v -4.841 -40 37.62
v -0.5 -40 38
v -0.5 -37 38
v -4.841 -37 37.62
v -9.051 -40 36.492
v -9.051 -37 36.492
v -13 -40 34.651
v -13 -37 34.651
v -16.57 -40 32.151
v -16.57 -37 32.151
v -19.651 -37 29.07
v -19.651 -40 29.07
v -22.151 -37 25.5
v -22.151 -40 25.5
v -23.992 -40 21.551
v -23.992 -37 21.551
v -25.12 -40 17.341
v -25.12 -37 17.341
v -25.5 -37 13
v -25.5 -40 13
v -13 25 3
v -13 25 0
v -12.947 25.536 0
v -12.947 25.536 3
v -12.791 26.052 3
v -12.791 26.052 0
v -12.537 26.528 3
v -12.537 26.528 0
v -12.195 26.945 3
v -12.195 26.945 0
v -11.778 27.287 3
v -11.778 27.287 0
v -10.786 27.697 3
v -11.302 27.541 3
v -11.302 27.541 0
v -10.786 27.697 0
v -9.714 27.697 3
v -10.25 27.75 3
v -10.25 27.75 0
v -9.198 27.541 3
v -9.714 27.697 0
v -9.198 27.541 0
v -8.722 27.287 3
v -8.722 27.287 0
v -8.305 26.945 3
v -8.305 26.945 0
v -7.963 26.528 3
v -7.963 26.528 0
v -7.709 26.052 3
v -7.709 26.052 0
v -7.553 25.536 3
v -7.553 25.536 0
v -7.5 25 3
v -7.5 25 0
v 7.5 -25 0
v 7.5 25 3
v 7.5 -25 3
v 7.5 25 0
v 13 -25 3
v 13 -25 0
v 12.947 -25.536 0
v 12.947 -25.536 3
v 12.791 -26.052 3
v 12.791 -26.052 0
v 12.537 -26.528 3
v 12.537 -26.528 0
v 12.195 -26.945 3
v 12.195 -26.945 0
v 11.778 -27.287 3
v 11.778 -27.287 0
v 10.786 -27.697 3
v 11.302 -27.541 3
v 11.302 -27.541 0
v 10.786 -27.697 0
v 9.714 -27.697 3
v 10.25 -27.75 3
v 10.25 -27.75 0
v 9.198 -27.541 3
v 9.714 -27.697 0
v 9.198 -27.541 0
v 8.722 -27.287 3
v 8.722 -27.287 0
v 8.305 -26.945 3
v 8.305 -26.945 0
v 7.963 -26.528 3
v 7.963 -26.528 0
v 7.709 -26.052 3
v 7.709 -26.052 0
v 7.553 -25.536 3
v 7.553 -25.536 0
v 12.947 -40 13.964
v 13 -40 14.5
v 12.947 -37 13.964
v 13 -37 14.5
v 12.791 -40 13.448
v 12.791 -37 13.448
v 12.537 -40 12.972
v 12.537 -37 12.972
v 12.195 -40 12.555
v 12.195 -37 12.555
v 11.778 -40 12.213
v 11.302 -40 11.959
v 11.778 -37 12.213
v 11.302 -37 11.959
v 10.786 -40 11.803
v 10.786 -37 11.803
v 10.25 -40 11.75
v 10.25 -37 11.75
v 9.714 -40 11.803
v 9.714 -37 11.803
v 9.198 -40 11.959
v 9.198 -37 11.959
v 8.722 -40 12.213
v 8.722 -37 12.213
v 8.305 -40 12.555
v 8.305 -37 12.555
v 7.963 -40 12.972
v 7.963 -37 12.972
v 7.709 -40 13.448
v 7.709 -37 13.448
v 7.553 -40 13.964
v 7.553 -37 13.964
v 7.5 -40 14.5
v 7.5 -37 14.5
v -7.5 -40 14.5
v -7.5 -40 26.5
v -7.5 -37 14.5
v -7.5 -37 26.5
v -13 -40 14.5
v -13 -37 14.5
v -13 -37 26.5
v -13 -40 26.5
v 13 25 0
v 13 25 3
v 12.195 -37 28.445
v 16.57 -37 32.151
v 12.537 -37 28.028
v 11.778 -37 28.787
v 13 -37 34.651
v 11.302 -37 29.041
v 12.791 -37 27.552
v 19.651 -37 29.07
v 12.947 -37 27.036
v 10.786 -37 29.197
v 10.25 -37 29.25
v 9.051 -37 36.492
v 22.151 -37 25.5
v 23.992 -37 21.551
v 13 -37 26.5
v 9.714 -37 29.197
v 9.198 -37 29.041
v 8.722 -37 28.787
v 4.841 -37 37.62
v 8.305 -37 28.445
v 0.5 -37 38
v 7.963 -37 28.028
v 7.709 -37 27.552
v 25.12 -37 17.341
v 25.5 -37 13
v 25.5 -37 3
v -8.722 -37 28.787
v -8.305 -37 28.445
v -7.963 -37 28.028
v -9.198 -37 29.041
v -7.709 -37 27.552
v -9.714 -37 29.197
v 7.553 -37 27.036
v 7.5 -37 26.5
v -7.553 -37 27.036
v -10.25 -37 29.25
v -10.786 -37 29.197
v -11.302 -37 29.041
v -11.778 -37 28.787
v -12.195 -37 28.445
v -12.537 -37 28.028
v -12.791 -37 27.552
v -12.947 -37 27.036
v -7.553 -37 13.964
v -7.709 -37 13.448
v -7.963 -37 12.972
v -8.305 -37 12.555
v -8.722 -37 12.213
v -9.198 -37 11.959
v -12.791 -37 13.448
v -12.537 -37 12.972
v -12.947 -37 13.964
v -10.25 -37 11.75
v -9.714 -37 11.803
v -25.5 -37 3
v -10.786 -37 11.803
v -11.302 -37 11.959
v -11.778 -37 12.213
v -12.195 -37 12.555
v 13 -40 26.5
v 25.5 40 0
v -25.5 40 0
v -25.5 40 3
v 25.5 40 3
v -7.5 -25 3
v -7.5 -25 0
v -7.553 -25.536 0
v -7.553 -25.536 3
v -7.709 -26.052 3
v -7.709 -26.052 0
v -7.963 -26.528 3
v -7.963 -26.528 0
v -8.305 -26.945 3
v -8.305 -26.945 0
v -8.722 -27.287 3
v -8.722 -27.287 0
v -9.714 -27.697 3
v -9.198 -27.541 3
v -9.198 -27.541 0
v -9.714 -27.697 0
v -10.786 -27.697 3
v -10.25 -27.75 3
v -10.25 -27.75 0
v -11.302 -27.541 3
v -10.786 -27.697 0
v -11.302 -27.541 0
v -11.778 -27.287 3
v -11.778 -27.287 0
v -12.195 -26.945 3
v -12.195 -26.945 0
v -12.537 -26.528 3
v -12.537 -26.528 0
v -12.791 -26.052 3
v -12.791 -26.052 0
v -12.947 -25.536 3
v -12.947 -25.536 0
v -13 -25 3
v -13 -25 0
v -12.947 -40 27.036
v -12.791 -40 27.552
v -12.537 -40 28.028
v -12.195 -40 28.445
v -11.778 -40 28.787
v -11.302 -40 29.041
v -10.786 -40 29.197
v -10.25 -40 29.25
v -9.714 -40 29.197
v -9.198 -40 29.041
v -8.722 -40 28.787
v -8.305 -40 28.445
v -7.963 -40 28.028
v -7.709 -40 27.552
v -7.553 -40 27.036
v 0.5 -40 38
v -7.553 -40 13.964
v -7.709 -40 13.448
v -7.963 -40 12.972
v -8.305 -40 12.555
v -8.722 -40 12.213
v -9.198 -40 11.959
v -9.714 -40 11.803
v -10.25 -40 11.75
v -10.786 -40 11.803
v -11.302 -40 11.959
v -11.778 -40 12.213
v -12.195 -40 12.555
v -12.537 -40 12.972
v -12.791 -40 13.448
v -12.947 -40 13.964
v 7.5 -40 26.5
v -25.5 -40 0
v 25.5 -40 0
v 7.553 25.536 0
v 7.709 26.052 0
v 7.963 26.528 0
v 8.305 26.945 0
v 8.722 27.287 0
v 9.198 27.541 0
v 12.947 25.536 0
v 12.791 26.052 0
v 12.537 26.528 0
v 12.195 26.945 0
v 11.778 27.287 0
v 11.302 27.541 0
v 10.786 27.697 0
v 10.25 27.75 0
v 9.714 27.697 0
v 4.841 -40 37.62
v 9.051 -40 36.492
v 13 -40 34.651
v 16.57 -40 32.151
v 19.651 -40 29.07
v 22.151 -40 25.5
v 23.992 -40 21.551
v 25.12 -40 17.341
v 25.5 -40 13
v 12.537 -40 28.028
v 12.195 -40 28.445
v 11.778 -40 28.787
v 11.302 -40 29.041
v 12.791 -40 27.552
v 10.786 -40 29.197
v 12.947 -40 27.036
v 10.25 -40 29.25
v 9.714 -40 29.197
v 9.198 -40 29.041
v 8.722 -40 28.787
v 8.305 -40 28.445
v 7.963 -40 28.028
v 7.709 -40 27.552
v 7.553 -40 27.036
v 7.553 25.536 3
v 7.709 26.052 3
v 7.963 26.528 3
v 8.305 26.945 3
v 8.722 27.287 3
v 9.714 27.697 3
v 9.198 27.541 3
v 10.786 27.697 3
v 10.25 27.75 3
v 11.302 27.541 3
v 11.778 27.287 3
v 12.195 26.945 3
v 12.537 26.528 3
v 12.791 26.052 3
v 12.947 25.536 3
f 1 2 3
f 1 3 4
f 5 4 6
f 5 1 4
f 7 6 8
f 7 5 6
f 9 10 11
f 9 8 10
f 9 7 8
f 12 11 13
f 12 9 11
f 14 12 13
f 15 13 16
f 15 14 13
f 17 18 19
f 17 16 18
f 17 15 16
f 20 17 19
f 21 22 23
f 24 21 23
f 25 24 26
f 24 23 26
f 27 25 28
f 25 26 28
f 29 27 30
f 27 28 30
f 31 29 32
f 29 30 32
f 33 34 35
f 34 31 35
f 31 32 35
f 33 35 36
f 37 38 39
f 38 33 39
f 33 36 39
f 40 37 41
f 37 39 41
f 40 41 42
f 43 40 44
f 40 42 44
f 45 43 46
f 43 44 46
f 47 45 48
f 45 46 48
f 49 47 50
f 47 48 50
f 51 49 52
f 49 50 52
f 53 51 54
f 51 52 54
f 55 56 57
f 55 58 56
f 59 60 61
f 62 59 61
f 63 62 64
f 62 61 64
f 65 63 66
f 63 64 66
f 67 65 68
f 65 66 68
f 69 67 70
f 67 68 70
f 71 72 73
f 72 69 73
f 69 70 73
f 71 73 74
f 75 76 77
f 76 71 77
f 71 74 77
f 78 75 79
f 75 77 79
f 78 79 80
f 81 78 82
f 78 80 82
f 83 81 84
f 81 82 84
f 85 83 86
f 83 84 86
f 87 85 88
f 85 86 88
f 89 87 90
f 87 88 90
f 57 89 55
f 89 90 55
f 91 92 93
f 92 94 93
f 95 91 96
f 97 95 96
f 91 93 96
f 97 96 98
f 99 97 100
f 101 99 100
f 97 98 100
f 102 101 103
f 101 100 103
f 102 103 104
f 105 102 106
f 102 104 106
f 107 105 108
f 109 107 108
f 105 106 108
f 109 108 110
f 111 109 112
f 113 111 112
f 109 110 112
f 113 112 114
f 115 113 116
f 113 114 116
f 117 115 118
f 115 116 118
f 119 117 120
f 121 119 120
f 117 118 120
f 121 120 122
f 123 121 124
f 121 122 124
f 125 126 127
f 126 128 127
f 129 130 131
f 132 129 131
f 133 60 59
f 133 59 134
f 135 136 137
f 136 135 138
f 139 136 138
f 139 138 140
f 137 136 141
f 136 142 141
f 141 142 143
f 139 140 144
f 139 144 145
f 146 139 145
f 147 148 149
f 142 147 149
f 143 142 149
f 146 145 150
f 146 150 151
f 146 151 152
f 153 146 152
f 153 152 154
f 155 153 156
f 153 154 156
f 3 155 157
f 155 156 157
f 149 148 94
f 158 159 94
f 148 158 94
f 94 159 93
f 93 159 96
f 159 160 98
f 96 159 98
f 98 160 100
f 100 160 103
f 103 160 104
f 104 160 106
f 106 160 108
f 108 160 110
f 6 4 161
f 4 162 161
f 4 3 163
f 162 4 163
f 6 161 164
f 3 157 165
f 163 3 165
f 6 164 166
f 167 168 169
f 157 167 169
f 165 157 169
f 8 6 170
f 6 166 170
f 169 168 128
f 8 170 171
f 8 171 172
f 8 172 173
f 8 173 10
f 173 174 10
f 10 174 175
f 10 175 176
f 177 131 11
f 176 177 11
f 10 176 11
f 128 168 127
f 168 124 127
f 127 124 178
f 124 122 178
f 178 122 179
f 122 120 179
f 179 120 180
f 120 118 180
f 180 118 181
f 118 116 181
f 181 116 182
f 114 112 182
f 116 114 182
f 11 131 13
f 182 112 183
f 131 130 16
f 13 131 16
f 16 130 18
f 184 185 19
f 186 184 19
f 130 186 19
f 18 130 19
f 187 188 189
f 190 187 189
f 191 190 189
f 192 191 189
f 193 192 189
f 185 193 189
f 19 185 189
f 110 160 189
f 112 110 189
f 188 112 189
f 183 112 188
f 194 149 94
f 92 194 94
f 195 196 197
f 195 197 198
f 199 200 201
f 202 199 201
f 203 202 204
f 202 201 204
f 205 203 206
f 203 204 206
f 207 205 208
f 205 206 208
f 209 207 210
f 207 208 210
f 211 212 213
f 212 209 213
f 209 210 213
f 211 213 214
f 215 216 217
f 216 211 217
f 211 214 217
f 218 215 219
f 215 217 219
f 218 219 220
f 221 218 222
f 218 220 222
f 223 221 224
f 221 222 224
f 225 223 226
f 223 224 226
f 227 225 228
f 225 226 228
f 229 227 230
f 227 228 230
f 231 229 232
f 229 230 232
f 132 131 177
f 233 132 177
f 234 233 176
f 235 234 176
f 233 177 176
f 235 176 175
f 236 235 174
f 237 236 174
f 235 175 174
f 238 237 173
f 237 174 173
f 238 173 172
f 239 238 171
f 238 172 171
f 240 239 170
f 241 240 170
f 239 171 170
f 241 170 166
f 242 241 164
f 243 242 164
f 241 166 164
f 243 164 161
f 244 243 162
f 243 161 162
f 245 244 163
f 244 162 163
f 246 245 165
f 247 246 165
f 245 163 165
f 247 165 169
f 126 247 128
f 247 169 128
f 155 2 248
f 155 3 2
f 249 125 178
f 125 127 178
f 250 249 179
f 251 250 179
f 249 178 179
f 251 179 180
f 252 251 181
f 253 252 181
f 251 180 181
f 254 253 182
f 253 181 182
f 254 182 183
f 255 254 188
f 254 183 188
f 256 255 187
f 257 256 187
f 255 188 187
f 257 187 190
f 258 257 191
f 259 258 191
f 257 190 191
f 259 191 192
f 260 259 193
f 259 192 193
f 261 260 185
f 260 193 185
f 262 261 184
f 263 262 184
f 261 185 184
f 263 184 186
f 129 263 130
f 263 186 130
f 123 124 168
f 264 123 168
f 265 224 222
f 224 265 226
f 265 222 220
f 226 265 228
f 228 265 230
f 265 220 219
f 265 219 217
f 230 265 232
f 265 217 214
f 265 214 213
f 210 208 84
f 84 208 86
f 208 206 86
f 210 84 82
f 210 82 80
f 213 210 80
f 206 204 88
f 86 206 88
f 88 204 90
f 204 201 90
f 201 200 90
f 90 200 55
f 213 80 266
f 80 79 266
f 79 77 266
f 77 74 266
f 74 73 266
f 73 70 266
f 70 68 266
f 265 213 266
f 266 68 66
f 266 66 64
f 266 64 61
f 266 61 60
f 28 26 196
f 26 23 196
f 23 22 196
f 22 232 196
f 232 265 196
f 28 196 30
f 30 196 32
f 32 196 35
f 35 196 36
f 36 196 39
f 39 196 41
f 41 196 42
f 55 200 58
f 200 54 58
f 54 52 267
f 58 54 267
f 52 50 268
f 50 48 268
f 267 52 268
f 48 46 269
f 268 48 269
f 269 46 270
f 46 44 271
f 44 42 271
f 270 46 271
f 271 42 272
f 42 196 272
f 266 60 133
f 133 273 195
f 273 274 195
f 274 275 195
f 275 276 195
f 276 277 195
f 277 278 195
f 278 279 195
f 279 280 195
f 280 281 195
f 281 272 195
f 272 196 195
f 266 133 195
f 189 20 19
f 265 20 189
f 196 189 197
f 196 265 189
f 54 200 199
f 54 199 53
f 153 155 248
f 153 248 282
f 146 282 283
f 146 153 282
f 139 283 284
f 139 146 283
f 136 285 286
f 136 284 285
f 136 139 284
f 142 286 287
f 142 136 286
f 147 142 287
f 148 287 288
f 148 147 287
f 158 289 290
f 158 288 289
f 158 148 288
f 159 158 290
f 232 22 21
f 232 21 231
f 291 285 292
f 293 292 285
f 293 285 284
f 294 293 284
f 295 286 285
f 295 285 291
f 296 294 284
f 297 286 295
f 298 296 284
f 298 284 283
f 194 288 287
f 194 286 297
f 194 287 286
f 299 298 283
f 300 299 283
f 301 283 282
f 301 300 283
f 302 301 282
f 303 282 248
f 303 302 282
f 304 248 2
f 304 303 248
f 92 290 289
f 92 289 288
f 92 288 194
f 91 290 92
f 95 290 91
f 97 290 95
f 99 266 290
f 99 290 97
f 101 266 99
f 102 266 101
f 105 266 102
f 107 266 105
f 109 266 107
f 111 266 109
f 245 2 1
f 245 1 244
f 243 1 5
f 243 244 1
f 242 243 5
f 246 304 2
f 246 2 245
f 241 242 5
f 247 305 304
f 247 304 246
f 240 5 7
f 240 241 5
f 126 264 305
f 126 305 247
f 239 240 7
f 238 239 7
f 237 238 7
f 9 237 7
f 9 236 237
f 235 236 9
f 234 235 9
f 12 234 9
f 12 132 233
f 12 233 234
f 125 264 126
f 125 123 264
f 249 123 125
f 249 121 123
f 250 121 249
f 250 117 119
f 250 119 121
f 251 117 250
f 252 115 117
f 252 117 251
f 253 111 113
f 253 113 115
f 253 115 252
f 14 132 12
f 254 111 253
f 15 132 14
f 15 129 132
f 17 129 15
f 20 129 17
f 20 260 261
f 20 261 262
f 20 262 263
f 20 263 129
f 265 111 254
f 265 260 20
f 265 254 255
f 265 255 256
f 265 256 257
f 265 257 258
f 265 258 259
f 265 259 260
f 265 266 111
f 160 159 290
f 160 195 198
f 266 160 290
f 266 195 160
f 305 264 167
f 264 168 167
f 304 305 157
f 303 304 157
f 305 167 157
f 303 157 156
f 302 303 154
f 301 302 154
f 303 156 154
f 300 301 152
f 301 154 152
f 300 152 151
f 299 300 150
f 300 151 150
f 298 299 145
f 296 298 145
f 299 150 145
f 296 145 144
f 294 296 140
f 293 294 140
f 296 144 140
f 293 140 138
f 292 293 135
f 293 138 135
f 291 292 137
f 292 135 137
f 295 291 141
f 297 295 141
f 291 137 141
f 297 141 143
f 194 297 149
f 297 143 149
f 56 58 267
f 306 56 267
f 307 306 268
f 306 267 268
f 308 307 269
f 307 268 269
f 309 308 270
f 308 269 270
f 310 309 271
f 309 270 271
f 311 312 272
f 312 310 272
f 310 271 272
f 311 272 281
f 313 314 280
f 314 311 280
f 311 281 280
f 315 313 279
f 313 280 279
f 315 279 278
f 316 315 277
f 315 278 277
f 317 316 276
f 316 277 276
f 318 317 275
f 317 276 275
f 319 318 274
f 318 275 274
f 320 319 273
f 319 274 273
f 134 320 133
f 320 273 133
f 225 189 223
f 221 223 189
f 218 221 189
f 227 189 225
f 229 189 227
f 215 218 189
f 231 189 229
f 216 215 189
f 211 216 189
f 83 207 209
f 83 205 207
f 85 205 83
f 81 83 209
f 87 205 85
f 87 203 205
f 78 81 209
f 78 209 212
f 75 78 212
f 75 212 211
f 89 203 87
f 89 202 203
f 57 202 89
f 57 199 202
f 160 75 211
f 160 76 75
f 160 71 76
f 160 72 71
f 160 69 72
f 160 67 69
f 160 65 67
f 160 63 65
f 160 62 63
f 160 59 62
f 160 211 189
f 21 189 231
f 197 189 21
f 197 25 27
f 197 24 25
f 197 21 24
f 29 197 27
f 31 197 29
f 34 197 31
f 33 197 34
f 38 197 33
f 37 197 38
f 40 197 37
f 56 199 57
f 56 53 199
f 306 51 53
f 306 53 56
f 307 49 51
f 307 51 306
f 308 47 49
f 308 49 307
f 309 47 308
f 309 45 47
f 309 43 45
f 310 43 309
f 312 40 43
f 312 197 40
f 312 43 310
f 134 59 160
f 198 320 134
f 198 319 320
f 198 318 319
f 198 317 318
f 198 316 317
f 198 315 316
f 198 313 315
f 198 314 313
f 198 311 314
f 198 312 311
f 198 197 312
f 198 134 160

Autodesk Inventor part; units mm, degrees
ref_plane "YZ Plane" through (0, 0, 0) normal (1, 0, 0) x (0, 1, 0)
ref_plane "XZ Plane" through (0, 0, 0) normal (0, 1, 0) x (-1, 0, 0)
ref_plane "XY Plane" through (0, 0, 0) normal (0, 0, 1) x (1, 0, 0)
sketch "Sketch2" plane through (0, 0, 0) normal (0, 0, 1) x (1, 0, 0)
  line L0 (-25.5, 40) -> (25.5, 40)
  line L1 (25.5, 40) -> (25.5, -40)
  line L2 (25.5, -40) -> (-25.5, -40)
  line L3 (-25.5, -40) -> (-25.5, 40)
  line L4 (-25.5, 40) -> (25.5, -40) construction
  line L5 (25.5, 40) -> (-25.5, -40) construction
  line L6 (-25.5, 0) -> (-10.25, 0) construction
  line L7 (25.5, 0) -> (10.25, 0) construction
  line L8 (-10.25, -25) -> (-10.25, 25) construction
  line L9 (-7.5, -25) -> (-7.5, 25)
  line L10 (-13, 25) -> (-13, -25)
  arc A0 (-13, -25) -> (-7.5, -25) centre (-10.25, -25) ccw
  arc A1 (-7.5, 25) -> (-13, 25) centre (-10.25, 25) ccw
  line L11 (10.25, -25) -> (10.25, 25) construction
  line L12 (13, -25) -> (13, 25)
  line L13 (7.5, 25) -> (7.5, -25)
  arc A2 (7.5, -25) -> (13, -25) centre (10.25, -25) ccw
  arc A3 (13, 25) -> (7.5, 25) centre (10.25, 25) ccw
  point P0 (0, 0)
  dimension "d2" = 51
  dimension "d3" = 80
  dimension "d4" = 15.25
  dimension "d5" = 15.25
  dimension "d6" = 25
  dimension "d7" = 5.5
  dimension "d8" = 25
  dimension "d9" = 5.5
extrude "Extrusion1" add sketch "Sketch2" along normal blind 3
sketch "Sketch3" plane through (0, 0, 3) normal (0, 0, 1) x (1, 0, 0)
  line L0 (25.5, -40) -> (25.5, 40) projected
  line L1 (-25.5, -40) -> (25.5, -40)
  line L2 (25.5, -40) -> (25.5, -37)
  line L3 (25.5, -37) -> (-25.5, -37)
  line L4 (-25.5, -37) -> (-25.5, -40)
  point P0 (0, 0)
  dimension "d12" = 3
extrude "Extrusion2" add sketch "Sketch3" along normal blind 35
sketch "Sketch4" plane through (-25.5, -37, 3) normal (0, 1, 0) x (1, 0, 0)
  line L0 (0, 0) -> (51, 0) construction
  line L1 (25.5, 0) -> (25.5, -35) construction
  line L2 (51, -35) -> (0, -35) construction
  line L3 (0, 3) -> (0, -35) construction
  line L4 (0, -17.5) -> (15.25, -17.5) construction
  line L5 (0, -17.5) -> (15.25, -17.5) construction
  line L6 (51, 0) -> (51, -35) construction
  line L7 (51, -17.5) -> (35.75, -17.5) construction
  line L8 (15.25, -23.5) -> (15.25, -11.5) construction
  line L9 (18, -23.5) -> (18, -11.5)
  line L10 (12.5, -11.5) -> (12.5, -23.5)
  arc A0 (12.5, -23.5) -> (18, -23.5) centre (15.25, -23.5) ccw
  arc A1 (18, -11.5) -> (12.5, -11.5) centre (15.25, -11.5) ccw
  line L11 (35.75, -23.5) -> (35.75, -11.5) construction
  line L12 (38.5, -23.5) -> (38.5, -11.5)
  line L13 (33, -11.5) -> (33, -23.5)
  arc A2 (33, -23.5) -> (38.5, -23.5) centre (35.75, -23.5) ccw
  arc A3 (38.5, -11.5) -> (33, -11.5) centre (35.75, -11.5) ccw
  point P0 (25.5, 3)
  dimension "d15" = 15.25
  dimension "d17" = 15.25
  dimension "d18" = 6
  dimension "d19" = 5.5
  dimension "d20" = 6
  dimension "d21" = 5.5
extrude "Extrusion3" cut sketch "Sketch4" against normal through all
fillet "Fillet2" radius 25 2 edges at (-25.5, -38.5, 38) (25.5, -38.5, 38)
properties part number "Vertical_L_Bracket" material "Aluminum 6061"
